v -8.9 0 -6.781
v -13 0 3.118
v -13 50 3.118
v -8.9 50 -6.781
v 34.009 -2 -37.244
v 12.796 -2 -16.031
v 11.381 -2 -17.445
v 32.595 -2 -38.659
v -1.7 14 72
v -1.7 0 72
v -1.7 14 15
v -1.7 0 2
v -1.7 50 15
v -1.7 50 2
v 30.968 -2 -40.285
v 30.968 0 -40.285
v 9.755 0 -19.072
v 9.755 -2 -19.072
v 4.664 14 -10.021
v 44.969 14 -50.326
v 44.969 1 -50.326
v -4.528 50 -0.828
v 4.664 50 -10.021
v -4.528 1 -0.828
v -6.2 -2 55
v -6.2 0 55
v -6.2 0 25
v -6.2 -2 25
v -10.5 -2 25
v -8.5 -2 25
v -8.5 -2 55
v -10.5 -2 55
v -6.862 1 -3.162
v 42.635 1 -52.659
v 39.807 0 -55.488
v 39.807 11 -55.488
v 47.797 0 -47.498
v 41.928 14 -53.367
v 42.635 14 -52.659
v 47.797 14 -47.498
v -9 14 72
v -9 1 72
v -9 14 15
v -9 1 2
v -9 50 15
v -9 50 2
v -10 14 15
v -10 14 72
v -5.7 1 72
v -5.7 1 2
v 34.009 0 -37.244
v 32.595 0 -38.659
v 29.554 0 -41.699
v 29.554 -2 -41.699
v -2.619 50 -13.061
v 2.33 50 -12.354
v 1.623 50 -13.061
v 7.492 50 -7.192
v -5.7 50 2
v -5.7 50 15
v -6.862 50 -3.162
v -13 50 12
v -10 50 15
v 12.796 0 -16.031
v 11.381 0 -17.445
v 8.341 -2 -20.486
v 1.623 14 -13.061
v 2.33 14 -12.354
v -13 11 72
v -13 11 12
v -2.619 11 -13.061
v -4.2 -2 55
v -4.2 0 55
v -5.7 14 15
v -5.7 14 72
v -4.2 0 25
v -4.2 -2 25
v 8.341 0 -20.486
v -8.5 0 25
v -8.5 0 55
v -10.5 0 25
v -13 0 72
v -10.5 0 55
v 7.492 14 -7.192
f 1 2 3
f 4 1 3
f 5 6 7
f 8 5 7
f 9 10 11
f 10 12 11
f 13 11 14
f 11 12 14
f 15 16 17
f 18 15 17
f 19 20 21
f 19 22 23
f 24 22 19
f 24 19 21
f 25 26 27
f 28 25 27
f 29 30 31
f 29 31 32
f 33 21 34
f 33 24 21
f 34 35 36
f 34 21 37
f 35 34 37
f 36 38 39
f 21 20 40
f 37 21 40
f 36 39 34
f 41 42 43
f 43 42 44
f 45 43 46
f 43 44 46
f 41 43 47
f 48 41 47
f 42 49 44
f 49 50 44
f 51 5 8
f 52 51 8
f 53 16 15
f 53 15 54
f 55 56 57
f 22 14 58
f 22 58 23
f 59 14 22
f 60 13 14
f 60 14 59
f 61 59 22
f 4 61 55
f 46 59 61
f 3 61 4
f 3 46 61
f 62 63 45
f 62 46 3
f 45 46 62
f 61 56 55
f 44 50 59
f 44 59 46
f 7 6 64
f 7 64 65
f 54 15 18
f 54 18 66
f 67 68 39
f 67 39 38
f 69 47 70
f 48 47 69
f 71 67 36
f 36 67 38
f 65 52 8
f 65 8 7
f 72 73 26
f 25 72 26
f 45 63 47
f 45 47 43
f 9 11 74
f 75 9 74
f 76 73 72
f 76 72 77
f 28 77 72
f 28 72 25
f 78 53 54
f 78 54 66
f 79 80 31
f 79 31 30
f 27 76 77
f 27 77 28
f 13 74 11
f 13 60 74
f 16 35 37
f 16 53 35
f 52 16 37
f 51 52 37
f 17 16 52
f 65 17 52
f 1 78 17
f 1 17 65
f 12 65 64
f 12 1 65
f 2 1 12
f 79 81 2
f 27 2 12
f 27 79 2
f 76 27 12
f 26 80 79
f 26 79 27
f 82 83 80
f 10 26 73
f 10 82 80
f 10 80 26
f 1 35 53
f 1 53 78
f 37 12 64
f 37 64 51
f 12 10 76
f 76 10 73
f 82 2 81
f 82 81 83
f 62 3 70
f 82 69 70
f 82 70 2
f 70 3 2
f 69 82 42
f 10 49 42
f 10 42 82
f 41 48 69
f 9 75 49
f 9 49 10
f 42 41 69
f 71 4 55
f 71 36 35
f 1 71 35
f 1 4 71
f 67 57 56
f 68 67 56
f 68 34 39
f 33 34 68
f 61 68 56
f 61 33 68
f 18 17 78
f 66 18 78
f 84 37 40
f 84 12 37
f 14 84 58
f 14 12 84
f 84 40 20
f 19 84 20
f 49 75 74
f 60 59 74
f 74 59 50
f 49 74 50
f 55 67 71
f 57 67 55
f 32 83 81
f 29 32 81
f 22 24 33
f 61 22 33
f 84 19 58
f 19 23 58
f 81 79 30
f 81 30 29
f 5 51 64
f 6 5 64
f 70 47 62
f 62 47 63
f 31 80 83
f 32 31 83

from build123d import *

# Parameters (mm, degrees)
BOSS_EXTRUDE1_DEPTH = 50
SKETCH3_W           = 3.3
SKETCH3_H           = 1
BOSS_EXTRUDE2_DEPTH = 13
BOSS_EXTRUDE3_DEPTH = 57
SKETCH6_W           = 2
SKETCH6_H           = 30
BOSS_EXTRUDE4_DEPTH = 2
CHAMFER1_START      = -14
CHAMFER1_OUTLINE_W  = 52
CHAMFER1_OUTLINE_H  = 13
CHAMFER1_DEPTH      = 3.182909169
CHAMFER2_SIZE       = 3


with BuildPart() as part:
    # Sketch2 → Boss-Extrude1 (new body)
    with BuildSketch(Plane(origin=(0, 0, 0), x_dir=(1, 0, 0), z_dir=(0, 1, 0))):
        Polygon((-1.7, -2), (-1.7, -15), (-5.7, -15), (-5.7, -2), (-9, -2), (-9, -15), (-13, -15), (-13, 2.680601608), align=None)
    extrude(amount=BOSS_EXTRUDE1_DEPTH)

    # Sketch3 → Boss-Extrude2 (add)
    with BuildSketch(Plane.XY.offset(2)):
        with Locations((-7.35, 0.5)):
            Rectangle(SKETCH3_W, SKETCH3_H)
    extrude(amount=BOSS_EXTRUDE2_DEPTH)

    # Sketch5 → Boss-Extrude3 (add)
    with BuildSketch(Plane.XY.offset(15)):
        Polygon((-13, 0), (-1.7, 0), (-1.7, 14), (-5.7, 14), (-5.7, 1), (-9, 1), (-9, 14), (-13, 14), align=None)
    extrude(amount=BOSS_EXTRUDE3_DEPTH)

    # Sketch6 → Boss-Extrude4 (add)
    with BuildSketch(Plane(origin=(0, 0, 0), x_dir=(-1, 0, 0), z_dir=(0, -1, 0))):
        with Locations((5.2, -40)):
            Rectangle(SKETCH6_W, SKETCH6_H)
        with Locations((9.5, -40)):
            Rectangle(SKETCH6_W, SKETCH6_H)
    extrude(amount=BOSS_EXTRUDE4_DEPTH)

    # Mirror1: part across plane


with BuildPart() as part_1:
    add(part.part)
    add(part.part.mirror(Plane(origin=(-0.956063716, 0, 2.308147732), x_dir=(0.9238798691632129, 0, 0.38268261961443256), z_dir=(0.3826826196144326, 0, -0.9238798691632131))))

    # Chamfer1: read off the stored shape, not the designer's step
    # Chamfer1 outline → Chamfer1 (cut)
    with BuildSketch(Plane(origin=(0, 0, 0), x_dir=(0, 1, 0), z_dir=(0.9238798691632129, 0, 0.38268261961443295)).offset(CHAMFER1_START)):
        with Locations((25, 2.5)):
            Rectangle(CHAMFER1_OUTLINE_W, CHAMFER1_OUTLINE_H)
    extrude(amount=CHAMFER1_DEPTH, mode=Mode.SUBTRACT)

    # Chamfer2
    chamfer2_edges = [part_1.edges().sort_by_distance(p)[0] for p in [
        (-13, 32, 15),
        (-13, 14, 43.5),
        (-0.497948704, 32, -15.182696898),
        (19.654559103, 14, -35.335275619),
    ]]
    chamfer(chamfer2_edges, length=CHAMFER2_SIZE)


solid = part_1.part
